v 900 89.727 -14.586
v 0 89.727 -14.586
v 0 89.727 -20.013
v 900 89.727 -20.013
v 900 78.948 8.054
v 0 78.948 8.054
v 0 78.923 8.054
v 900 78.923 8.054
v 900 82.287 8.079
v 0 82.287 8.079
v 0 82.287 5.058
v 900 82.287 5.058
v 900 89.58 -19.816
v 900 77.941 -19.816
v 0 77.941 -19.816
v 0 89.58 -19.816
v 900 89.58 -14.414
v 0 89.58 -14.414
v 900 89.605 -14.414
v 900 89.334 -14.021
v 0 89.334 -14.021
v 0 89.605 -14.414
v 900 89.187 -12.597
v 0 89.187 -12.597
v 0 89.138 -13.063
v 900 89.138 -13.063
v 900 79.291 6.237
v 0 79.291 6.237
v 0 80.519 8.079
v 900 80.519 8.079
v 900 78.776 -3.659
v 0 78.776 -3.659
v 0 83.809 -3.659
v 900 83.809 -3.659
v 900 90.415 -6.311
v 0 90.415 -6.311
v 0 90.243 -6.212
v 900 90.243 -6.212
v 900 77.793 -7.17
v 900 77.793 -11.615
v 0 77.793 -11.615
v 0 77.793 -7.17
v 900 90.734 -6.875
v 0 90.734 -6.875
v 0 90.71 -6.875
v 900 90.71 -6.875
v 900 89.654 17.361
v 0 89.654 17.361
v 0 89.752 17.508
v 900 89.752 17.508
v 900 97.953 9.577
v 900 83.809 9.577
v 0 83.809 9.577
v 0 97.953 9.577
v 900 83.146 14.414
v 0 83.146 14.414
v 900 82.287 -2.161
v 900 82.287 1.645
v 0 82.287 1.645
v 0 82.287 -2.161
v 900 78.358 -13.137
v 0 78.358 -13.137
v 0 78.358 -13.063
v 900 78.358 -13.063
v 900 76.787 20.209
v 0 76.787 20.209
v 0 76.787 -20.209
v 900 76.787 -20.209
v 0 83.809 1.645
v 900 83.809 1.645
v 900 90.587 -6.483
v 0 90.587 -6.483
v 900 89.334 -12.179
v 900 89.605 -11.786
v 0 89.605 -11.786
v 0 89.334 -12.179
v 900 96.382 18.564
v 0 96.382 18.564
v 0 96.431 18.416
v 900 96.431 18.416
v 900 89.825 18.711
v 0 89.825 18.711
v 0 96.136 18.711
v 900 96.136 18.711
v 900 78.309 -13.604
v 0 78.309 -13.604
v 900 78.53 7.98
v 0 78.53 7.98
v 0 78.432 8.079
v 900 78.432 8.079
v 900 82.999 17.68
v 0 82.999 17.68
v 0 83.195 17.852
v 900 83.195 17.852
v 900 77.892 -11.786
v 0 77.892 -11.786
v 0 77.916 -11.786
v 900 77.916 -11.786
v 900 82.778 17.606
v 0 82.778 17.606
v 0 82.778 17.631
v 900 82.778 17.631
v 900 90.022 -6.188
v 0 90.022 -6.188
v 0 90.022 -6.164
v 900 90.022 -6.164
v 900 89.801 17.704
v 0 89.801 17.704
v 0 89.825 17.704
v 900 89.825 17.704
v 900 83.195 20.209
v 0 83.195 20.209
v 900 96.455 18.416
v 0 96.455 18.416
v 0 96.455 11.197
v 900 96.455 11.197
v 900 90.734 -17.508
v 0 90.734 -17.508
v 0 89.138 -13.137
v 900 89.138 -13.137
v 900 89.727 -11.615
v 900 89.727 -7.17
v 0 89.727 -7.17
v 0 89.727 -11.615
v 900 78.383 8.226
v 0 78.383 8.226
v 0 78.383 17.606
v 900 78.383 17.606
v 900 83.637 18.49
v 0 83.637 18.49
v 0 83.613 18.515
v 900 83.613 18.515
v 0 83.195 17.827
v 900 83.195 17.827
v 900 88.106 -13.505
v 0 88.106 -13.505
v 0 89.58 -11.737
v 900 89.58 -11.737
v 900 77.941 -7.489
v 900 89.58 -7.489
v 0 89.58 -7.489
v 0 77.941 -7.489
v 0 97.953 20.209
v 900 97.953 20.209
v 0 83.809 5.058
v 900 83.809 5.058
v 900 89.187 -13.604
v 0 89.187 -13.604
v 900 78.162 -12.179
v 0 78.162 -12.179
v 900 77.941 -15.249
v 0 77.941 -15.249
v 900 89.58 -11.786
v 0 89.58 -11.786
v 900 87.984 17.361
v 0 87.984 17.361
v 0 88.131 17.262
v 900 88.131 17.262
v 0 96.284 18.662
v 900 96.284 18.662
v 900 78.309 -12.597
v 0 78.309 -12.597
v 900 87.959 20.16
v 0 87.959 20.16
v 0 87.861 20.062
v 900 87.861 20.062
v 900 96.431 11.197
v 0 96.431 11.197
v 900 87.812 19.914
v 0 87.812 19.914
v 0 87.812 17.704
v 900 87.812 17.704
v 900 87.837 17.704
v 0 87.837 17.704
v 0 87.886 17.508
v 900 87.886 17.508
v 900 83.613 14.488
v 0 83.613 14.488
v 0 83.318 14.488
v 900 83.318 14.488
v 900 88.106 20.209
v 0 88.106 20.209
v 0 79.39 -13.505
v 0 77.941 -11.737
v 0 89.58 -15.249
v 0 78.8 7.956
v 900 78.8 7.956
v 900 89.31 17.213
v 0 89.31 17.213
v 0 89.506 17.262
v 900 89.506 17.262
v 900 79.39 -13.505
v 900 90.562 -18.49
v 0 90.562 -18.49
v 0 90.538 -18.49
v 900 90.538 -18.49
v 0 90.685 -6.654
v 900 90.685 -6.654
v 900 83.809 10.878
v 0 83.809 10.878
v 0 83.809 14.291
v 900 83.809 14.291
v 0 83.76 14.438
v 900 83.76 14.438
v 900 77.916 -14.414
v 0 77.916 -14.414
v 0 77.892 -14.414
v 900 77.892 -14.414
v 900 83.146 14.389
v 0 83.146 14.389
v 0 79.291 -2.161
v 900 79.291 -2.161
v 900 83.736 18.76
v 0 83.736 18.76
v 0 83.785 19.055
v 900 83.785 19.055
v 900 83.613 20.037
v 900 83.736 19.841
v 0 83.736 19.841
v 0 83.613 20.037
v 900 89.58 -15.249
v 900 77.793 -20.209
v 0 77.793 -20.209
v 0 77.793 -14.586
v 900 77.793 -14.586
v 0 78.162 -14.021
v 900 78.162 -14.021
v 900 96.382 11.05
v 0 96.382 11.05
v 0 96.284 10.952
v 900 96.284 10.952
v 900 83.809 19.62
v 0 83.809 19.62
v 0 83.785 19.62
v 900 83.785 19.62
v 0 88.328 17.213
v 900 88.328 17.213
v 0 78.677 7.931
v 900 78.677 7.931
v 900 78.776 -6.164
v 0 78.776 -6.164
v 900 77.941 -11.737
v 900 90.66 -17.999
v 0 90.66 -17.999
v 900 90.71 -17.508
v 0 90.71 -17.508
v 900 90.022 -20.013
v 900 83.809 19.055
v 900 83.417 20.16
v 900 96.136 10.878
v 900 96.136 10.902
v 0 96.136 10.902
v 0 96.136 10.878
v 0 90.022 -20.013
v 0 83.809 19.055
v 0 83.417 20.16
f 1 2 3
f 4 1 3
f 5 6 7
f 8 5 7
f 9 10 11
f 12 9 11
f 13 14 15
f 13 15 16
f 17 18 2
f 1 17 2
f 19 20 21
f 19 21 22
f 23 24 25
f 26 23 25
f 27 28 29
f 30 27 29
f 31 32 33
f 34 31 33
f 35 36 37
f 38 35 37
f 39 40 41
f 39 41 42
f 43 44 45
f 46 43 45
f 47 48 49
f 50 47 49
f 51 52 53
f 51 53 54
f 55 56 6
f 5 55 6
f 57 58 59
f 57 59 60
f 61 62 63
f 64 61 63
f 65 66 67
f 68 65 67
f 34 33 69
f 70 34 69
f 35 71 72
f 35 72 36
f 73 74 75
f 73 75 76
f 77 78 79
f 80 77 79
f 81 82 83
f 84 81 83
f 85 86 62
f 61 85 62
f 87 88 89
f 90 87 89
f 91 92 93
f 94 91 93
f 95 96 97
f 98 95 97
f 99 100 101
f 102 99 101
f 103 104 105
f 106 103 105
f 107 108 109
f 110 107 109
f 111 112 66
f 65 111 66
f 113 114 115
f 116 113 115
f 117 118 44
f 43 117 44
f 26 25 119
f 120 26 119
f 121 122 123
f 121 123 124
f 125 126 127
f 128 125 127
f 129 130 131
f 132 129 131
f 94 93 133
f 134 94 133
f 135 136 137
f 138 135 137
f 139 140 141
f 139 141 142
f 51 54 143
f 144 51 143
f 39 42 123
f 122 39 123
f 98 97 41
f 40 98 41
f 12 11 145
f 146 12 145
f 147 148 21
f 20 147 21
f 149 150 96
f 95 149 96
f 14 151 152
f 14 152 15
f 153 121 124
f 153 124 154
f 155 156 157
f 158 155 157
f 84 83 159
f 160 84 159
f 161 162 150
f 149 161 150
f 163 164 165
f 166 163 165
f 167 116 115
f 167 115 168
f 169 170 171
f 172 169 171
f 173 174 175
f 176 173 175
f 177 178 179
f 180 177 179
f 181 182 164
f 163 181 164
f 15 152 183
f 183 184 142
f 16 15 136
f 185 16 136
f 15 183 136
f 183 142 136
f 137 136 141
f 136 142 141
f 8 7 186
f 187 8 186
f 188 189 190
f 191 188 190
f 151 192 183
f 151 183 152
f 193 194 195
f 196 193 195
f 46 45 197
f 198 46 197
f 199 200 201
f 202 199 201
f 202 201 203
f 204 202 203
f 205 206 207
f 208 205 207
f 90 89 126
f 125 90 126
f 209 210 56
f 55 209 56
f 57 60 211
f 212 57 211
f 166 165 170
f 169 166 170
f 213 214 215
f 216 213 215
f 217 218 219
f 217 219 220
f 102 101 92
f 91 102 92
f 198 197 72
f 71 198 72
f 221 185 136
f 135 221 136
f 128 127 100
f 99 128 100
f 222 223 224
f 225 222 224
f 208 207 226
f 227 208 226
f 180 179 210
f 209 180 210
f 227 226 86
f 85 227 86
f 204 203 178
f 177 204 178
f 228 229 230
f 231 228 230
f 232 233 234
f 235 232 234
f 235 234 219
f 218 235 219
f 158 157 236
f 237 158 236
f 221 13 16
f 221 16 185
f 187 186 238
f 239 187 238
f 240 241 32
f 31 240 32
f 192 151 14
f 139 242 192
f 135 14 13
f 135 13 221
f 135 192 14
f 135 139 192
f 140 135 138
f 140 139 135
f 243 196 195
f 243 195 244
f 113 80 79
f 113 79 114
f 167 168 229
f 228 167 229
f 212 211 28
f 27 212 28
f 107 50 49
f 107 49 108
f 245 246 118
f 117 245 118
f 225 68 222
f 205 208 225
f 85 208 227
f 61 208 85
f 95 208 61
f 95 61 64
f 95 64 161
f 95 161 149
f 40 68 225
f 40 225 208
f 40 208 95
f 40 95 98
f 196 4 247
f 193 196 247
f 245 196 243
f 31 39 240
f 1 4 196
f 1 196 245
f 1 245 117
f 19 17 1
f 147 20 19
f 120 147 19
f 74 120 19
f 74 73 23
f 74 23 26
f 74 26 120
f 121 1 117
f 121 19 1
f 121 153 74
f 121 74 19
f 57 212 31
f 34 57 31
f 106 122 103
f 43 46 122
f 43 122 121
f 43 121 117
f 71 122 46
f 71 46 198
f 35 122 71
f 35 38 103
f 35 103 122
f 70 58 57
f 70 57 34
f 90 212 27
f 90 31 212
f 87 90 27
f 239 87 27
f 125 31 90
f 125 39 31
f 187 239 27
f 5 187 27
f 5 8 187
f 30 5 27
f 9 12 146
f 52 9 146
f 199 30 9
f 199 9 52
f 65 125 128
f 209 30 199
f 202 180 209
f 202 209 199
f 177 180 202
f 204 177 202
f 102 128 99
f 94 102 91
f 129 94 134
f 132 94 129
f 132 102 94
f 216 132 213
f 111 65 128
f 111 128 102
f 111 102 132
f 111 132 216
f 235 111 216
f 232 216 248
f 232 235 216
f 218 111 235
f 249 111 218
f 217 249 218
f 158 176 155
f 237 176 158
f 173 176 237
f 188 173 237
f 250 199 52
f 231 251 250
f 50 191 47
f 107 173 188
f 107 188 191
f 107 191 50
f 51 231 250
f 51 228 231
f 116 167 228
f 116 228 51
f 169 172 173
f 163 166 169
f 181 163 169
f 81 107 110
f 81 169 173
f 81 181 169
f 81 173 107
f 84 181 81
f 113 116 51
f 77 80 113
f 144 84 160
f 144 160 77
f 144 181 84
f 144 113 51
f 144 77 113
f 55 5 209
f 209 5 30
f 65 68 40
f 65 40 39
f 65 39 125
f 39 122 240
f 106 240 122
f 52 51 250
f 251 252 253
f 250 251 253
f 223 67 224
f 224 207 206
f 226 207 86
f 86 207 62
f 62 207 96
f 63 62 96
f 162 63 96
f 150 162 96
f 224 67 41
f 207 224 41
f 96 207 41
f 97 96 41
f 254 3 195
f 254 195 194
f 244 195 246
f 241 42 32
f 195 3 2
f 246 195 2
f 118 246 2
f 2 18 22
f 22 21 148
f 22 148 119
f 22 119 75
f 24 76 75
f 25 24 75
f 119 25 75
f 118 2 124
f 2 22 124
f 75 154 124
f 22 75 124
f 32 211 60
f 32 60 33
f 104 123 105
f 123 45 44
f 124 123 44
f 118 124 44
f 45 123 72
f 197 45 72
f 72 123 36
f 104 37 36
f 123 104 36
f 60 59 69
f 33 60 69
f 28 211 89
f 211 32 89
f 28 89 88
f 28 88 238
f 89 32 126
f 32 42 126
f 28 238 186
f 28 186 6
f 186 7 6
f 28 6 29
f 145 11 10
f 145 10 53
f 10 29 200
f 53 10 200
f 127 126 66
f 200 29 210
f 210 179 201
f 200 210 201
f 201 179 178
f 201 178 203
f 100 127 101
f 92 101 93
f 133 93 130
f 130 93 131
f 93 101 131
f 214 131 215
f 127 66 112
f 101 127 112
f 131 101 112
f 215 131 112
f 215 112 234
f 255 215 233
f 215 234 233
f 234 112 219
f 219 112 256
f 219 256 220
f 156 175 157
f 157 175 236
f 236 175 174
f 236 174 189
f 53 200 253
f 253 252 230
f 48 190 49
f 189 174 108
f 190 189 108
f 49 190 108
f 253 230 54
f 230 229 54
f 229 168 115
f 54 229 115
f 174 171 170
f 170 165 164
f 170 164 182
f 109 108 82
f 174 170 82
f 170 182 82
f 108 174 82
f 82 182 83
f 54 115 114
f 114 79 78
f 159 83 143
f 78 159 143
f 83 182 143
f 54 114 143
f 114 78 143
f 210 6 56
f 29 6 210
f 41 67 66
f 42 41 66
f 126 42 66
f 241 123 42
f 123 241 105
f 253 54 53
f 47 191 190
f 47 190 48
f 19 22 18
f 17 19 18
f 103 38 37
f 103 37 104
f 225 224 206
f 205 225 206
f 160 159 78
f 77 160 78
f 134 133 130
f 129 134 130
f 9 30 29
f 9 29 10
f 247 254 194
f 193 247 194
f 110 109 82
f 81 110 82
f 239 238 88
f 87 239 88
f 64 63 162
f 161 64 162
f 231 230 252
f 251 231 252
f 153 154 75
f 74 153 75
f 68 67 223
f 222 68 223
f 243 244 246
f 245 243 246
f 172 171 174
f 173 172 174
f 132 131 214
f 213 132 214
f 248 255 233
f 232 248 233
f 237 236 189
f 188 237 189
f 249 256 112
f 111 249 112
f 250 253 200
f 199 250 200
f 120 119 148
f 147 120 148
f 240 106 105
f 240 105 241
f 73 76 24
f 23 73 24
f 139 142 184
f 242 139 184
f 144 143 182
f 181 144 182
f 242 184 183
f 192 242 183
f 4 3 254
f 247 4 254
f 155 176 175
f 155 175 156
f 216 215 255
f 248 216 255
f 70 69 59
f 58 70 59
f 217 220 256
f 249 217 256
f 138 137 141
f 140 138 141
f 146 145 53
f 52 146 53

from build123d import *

# Parameters (mm, degrees)
F1_DEPTH = 900


with BuildPart() as f1:
    # F0 (on Right) → F1 (new body)
    with BuildSketch(Plane.YZ):
        Polygon((97.953237, 9.576591), (97.953237, 20.209017), (88.106465, 20.209017), (87.959187, 20.159924), (87.860829, 20.061739), (87.811737, 19.914461), (87.811737, 17.704432), (87.836541, 17.704432), (87.885806, 17.507717), (87.983819, 17.360612), (88.131269, 17.262254), (88.32764, 17.213162), (89.309664, 17.213162), (89.506207, 17.262254), (89.653657, 17.360612), (89.751842, 17.507717), (89.800935, 17.704432), (89.825395, 17.704432), (89.825395, 18.711261), (96.136121, 18.711261), (96.283571, 18.661997), (96.381584, 18.563811), (96.430677, 18.416361), (96.455309, 18.416361), (96.455309, 11.197164), (96.430677, 11.197164), (96.381584, 11.049886), (96.283571, 10.951701), (96.136121, 10.902263), (96.136121, 10.877976), (83.809397, 10.877976), (83.809397, 14.291204), (83.760132, 14.438482), (83.613027, 14.487747), (83.318299, 14.487747), (83.146388, 14.389389), (83.146388, 14.414022), (78.947506, 8.054203), (78.922874, 8.054203), (78.800056, 7.955846), (78.677238, 7.931385), (78.529961, 7.980478), (78.431775, 8.078663), (78.382683, 8.226113), (78.382683, 17.606075), (82.778108, 17.606075), (82.778108, 17.630707), (82.999283, 17.6798), (83.195481, 17.85171), (83.195481, 17.827078), (83.637487, 18.490086), (83.613027, 18.514719), (83.735672, 18.760354), (83.784937, 19.05491), (83.809397, 19.05491), (83.809397, 19.619733), (83.784937, 19.619733), (83.735672, 19.840736), (83.613027, 20.037279), (83.416656, 20.159924), (83.195481, 20.209017), (76.78657, 20.209017), (76.78657, -20.209016), (77.793399, -20.209016), (77.793399, -14.585931), (77.916045, -14.414021), (77.891584, -14.414021), (78.16168, -14.021108), (78.308958, -13.603562), (78.358223, -13.136924), (78.358223, -13.063371), (78.308958, -12.596733), (78.16168, -12.17936), (77.891584, -11.786274), (77.916045, -11.786274), (77.793399, -11.614708), (77.793399, -7.170018), (89.727382, -7.170018), (89.727382, -11.614708), (89.57976, -11.786274), (89.604564, -11.786274), (89.334469, -12.17936), (89.187019, -12.596733), (89.137926, -13.063371), (89.137926, -13.136924), (89.187019, -13.603562), (89.334469, -14.021108), (89.604564, -14.414021), (89.57976, -14.414021), (89.727382, -14.585931), (89.727382, -20.012645), (90.02211, -20.012645), (90.562129, -18.490085), (90.537669, -18.490085), (90.660314, -17.998987), (90.709579, -17.508061), (90.733867, -17.508061), (90.733867, -6.875291), (90.709579, -6.875291), (90.684774, -6.65446), (90.586589, -6.48255), (90.414851, -6.310639), (90.242768, -6.212454), (90.02211, -6.187994), (90.02211, -6.163534), (78.775596, -6.163534), (78.775596, -3.658949), (83.809397, -3.658949), (83.809397, 1.64512), (82.286837, 1.64512), (82.286837, -2.160677), (79.291327, -2.160677), (79.291327, 6.237087), (80.518986, 8.078663), (81.402912, 8.078663), (82.286837, 8.078663), (82.286837, 5.058348), (83.809397, 5.058348), (83.809397, 9.576591), align=None)
        Polygon((77.940505, -7.489207), (77.940505, -11.737354), (79.389512, -13.505377), (77.940505, -15.24894), (77.940505, -19.816103), (89.57976, -19.816103), (89.57976, -15.24894), (88.106465, -13.505377), (89.57976, -11.737354), (89.57976, -7.489207), align=None)
    extrude(amount=F1_DEPTH)


solid = f1.part
